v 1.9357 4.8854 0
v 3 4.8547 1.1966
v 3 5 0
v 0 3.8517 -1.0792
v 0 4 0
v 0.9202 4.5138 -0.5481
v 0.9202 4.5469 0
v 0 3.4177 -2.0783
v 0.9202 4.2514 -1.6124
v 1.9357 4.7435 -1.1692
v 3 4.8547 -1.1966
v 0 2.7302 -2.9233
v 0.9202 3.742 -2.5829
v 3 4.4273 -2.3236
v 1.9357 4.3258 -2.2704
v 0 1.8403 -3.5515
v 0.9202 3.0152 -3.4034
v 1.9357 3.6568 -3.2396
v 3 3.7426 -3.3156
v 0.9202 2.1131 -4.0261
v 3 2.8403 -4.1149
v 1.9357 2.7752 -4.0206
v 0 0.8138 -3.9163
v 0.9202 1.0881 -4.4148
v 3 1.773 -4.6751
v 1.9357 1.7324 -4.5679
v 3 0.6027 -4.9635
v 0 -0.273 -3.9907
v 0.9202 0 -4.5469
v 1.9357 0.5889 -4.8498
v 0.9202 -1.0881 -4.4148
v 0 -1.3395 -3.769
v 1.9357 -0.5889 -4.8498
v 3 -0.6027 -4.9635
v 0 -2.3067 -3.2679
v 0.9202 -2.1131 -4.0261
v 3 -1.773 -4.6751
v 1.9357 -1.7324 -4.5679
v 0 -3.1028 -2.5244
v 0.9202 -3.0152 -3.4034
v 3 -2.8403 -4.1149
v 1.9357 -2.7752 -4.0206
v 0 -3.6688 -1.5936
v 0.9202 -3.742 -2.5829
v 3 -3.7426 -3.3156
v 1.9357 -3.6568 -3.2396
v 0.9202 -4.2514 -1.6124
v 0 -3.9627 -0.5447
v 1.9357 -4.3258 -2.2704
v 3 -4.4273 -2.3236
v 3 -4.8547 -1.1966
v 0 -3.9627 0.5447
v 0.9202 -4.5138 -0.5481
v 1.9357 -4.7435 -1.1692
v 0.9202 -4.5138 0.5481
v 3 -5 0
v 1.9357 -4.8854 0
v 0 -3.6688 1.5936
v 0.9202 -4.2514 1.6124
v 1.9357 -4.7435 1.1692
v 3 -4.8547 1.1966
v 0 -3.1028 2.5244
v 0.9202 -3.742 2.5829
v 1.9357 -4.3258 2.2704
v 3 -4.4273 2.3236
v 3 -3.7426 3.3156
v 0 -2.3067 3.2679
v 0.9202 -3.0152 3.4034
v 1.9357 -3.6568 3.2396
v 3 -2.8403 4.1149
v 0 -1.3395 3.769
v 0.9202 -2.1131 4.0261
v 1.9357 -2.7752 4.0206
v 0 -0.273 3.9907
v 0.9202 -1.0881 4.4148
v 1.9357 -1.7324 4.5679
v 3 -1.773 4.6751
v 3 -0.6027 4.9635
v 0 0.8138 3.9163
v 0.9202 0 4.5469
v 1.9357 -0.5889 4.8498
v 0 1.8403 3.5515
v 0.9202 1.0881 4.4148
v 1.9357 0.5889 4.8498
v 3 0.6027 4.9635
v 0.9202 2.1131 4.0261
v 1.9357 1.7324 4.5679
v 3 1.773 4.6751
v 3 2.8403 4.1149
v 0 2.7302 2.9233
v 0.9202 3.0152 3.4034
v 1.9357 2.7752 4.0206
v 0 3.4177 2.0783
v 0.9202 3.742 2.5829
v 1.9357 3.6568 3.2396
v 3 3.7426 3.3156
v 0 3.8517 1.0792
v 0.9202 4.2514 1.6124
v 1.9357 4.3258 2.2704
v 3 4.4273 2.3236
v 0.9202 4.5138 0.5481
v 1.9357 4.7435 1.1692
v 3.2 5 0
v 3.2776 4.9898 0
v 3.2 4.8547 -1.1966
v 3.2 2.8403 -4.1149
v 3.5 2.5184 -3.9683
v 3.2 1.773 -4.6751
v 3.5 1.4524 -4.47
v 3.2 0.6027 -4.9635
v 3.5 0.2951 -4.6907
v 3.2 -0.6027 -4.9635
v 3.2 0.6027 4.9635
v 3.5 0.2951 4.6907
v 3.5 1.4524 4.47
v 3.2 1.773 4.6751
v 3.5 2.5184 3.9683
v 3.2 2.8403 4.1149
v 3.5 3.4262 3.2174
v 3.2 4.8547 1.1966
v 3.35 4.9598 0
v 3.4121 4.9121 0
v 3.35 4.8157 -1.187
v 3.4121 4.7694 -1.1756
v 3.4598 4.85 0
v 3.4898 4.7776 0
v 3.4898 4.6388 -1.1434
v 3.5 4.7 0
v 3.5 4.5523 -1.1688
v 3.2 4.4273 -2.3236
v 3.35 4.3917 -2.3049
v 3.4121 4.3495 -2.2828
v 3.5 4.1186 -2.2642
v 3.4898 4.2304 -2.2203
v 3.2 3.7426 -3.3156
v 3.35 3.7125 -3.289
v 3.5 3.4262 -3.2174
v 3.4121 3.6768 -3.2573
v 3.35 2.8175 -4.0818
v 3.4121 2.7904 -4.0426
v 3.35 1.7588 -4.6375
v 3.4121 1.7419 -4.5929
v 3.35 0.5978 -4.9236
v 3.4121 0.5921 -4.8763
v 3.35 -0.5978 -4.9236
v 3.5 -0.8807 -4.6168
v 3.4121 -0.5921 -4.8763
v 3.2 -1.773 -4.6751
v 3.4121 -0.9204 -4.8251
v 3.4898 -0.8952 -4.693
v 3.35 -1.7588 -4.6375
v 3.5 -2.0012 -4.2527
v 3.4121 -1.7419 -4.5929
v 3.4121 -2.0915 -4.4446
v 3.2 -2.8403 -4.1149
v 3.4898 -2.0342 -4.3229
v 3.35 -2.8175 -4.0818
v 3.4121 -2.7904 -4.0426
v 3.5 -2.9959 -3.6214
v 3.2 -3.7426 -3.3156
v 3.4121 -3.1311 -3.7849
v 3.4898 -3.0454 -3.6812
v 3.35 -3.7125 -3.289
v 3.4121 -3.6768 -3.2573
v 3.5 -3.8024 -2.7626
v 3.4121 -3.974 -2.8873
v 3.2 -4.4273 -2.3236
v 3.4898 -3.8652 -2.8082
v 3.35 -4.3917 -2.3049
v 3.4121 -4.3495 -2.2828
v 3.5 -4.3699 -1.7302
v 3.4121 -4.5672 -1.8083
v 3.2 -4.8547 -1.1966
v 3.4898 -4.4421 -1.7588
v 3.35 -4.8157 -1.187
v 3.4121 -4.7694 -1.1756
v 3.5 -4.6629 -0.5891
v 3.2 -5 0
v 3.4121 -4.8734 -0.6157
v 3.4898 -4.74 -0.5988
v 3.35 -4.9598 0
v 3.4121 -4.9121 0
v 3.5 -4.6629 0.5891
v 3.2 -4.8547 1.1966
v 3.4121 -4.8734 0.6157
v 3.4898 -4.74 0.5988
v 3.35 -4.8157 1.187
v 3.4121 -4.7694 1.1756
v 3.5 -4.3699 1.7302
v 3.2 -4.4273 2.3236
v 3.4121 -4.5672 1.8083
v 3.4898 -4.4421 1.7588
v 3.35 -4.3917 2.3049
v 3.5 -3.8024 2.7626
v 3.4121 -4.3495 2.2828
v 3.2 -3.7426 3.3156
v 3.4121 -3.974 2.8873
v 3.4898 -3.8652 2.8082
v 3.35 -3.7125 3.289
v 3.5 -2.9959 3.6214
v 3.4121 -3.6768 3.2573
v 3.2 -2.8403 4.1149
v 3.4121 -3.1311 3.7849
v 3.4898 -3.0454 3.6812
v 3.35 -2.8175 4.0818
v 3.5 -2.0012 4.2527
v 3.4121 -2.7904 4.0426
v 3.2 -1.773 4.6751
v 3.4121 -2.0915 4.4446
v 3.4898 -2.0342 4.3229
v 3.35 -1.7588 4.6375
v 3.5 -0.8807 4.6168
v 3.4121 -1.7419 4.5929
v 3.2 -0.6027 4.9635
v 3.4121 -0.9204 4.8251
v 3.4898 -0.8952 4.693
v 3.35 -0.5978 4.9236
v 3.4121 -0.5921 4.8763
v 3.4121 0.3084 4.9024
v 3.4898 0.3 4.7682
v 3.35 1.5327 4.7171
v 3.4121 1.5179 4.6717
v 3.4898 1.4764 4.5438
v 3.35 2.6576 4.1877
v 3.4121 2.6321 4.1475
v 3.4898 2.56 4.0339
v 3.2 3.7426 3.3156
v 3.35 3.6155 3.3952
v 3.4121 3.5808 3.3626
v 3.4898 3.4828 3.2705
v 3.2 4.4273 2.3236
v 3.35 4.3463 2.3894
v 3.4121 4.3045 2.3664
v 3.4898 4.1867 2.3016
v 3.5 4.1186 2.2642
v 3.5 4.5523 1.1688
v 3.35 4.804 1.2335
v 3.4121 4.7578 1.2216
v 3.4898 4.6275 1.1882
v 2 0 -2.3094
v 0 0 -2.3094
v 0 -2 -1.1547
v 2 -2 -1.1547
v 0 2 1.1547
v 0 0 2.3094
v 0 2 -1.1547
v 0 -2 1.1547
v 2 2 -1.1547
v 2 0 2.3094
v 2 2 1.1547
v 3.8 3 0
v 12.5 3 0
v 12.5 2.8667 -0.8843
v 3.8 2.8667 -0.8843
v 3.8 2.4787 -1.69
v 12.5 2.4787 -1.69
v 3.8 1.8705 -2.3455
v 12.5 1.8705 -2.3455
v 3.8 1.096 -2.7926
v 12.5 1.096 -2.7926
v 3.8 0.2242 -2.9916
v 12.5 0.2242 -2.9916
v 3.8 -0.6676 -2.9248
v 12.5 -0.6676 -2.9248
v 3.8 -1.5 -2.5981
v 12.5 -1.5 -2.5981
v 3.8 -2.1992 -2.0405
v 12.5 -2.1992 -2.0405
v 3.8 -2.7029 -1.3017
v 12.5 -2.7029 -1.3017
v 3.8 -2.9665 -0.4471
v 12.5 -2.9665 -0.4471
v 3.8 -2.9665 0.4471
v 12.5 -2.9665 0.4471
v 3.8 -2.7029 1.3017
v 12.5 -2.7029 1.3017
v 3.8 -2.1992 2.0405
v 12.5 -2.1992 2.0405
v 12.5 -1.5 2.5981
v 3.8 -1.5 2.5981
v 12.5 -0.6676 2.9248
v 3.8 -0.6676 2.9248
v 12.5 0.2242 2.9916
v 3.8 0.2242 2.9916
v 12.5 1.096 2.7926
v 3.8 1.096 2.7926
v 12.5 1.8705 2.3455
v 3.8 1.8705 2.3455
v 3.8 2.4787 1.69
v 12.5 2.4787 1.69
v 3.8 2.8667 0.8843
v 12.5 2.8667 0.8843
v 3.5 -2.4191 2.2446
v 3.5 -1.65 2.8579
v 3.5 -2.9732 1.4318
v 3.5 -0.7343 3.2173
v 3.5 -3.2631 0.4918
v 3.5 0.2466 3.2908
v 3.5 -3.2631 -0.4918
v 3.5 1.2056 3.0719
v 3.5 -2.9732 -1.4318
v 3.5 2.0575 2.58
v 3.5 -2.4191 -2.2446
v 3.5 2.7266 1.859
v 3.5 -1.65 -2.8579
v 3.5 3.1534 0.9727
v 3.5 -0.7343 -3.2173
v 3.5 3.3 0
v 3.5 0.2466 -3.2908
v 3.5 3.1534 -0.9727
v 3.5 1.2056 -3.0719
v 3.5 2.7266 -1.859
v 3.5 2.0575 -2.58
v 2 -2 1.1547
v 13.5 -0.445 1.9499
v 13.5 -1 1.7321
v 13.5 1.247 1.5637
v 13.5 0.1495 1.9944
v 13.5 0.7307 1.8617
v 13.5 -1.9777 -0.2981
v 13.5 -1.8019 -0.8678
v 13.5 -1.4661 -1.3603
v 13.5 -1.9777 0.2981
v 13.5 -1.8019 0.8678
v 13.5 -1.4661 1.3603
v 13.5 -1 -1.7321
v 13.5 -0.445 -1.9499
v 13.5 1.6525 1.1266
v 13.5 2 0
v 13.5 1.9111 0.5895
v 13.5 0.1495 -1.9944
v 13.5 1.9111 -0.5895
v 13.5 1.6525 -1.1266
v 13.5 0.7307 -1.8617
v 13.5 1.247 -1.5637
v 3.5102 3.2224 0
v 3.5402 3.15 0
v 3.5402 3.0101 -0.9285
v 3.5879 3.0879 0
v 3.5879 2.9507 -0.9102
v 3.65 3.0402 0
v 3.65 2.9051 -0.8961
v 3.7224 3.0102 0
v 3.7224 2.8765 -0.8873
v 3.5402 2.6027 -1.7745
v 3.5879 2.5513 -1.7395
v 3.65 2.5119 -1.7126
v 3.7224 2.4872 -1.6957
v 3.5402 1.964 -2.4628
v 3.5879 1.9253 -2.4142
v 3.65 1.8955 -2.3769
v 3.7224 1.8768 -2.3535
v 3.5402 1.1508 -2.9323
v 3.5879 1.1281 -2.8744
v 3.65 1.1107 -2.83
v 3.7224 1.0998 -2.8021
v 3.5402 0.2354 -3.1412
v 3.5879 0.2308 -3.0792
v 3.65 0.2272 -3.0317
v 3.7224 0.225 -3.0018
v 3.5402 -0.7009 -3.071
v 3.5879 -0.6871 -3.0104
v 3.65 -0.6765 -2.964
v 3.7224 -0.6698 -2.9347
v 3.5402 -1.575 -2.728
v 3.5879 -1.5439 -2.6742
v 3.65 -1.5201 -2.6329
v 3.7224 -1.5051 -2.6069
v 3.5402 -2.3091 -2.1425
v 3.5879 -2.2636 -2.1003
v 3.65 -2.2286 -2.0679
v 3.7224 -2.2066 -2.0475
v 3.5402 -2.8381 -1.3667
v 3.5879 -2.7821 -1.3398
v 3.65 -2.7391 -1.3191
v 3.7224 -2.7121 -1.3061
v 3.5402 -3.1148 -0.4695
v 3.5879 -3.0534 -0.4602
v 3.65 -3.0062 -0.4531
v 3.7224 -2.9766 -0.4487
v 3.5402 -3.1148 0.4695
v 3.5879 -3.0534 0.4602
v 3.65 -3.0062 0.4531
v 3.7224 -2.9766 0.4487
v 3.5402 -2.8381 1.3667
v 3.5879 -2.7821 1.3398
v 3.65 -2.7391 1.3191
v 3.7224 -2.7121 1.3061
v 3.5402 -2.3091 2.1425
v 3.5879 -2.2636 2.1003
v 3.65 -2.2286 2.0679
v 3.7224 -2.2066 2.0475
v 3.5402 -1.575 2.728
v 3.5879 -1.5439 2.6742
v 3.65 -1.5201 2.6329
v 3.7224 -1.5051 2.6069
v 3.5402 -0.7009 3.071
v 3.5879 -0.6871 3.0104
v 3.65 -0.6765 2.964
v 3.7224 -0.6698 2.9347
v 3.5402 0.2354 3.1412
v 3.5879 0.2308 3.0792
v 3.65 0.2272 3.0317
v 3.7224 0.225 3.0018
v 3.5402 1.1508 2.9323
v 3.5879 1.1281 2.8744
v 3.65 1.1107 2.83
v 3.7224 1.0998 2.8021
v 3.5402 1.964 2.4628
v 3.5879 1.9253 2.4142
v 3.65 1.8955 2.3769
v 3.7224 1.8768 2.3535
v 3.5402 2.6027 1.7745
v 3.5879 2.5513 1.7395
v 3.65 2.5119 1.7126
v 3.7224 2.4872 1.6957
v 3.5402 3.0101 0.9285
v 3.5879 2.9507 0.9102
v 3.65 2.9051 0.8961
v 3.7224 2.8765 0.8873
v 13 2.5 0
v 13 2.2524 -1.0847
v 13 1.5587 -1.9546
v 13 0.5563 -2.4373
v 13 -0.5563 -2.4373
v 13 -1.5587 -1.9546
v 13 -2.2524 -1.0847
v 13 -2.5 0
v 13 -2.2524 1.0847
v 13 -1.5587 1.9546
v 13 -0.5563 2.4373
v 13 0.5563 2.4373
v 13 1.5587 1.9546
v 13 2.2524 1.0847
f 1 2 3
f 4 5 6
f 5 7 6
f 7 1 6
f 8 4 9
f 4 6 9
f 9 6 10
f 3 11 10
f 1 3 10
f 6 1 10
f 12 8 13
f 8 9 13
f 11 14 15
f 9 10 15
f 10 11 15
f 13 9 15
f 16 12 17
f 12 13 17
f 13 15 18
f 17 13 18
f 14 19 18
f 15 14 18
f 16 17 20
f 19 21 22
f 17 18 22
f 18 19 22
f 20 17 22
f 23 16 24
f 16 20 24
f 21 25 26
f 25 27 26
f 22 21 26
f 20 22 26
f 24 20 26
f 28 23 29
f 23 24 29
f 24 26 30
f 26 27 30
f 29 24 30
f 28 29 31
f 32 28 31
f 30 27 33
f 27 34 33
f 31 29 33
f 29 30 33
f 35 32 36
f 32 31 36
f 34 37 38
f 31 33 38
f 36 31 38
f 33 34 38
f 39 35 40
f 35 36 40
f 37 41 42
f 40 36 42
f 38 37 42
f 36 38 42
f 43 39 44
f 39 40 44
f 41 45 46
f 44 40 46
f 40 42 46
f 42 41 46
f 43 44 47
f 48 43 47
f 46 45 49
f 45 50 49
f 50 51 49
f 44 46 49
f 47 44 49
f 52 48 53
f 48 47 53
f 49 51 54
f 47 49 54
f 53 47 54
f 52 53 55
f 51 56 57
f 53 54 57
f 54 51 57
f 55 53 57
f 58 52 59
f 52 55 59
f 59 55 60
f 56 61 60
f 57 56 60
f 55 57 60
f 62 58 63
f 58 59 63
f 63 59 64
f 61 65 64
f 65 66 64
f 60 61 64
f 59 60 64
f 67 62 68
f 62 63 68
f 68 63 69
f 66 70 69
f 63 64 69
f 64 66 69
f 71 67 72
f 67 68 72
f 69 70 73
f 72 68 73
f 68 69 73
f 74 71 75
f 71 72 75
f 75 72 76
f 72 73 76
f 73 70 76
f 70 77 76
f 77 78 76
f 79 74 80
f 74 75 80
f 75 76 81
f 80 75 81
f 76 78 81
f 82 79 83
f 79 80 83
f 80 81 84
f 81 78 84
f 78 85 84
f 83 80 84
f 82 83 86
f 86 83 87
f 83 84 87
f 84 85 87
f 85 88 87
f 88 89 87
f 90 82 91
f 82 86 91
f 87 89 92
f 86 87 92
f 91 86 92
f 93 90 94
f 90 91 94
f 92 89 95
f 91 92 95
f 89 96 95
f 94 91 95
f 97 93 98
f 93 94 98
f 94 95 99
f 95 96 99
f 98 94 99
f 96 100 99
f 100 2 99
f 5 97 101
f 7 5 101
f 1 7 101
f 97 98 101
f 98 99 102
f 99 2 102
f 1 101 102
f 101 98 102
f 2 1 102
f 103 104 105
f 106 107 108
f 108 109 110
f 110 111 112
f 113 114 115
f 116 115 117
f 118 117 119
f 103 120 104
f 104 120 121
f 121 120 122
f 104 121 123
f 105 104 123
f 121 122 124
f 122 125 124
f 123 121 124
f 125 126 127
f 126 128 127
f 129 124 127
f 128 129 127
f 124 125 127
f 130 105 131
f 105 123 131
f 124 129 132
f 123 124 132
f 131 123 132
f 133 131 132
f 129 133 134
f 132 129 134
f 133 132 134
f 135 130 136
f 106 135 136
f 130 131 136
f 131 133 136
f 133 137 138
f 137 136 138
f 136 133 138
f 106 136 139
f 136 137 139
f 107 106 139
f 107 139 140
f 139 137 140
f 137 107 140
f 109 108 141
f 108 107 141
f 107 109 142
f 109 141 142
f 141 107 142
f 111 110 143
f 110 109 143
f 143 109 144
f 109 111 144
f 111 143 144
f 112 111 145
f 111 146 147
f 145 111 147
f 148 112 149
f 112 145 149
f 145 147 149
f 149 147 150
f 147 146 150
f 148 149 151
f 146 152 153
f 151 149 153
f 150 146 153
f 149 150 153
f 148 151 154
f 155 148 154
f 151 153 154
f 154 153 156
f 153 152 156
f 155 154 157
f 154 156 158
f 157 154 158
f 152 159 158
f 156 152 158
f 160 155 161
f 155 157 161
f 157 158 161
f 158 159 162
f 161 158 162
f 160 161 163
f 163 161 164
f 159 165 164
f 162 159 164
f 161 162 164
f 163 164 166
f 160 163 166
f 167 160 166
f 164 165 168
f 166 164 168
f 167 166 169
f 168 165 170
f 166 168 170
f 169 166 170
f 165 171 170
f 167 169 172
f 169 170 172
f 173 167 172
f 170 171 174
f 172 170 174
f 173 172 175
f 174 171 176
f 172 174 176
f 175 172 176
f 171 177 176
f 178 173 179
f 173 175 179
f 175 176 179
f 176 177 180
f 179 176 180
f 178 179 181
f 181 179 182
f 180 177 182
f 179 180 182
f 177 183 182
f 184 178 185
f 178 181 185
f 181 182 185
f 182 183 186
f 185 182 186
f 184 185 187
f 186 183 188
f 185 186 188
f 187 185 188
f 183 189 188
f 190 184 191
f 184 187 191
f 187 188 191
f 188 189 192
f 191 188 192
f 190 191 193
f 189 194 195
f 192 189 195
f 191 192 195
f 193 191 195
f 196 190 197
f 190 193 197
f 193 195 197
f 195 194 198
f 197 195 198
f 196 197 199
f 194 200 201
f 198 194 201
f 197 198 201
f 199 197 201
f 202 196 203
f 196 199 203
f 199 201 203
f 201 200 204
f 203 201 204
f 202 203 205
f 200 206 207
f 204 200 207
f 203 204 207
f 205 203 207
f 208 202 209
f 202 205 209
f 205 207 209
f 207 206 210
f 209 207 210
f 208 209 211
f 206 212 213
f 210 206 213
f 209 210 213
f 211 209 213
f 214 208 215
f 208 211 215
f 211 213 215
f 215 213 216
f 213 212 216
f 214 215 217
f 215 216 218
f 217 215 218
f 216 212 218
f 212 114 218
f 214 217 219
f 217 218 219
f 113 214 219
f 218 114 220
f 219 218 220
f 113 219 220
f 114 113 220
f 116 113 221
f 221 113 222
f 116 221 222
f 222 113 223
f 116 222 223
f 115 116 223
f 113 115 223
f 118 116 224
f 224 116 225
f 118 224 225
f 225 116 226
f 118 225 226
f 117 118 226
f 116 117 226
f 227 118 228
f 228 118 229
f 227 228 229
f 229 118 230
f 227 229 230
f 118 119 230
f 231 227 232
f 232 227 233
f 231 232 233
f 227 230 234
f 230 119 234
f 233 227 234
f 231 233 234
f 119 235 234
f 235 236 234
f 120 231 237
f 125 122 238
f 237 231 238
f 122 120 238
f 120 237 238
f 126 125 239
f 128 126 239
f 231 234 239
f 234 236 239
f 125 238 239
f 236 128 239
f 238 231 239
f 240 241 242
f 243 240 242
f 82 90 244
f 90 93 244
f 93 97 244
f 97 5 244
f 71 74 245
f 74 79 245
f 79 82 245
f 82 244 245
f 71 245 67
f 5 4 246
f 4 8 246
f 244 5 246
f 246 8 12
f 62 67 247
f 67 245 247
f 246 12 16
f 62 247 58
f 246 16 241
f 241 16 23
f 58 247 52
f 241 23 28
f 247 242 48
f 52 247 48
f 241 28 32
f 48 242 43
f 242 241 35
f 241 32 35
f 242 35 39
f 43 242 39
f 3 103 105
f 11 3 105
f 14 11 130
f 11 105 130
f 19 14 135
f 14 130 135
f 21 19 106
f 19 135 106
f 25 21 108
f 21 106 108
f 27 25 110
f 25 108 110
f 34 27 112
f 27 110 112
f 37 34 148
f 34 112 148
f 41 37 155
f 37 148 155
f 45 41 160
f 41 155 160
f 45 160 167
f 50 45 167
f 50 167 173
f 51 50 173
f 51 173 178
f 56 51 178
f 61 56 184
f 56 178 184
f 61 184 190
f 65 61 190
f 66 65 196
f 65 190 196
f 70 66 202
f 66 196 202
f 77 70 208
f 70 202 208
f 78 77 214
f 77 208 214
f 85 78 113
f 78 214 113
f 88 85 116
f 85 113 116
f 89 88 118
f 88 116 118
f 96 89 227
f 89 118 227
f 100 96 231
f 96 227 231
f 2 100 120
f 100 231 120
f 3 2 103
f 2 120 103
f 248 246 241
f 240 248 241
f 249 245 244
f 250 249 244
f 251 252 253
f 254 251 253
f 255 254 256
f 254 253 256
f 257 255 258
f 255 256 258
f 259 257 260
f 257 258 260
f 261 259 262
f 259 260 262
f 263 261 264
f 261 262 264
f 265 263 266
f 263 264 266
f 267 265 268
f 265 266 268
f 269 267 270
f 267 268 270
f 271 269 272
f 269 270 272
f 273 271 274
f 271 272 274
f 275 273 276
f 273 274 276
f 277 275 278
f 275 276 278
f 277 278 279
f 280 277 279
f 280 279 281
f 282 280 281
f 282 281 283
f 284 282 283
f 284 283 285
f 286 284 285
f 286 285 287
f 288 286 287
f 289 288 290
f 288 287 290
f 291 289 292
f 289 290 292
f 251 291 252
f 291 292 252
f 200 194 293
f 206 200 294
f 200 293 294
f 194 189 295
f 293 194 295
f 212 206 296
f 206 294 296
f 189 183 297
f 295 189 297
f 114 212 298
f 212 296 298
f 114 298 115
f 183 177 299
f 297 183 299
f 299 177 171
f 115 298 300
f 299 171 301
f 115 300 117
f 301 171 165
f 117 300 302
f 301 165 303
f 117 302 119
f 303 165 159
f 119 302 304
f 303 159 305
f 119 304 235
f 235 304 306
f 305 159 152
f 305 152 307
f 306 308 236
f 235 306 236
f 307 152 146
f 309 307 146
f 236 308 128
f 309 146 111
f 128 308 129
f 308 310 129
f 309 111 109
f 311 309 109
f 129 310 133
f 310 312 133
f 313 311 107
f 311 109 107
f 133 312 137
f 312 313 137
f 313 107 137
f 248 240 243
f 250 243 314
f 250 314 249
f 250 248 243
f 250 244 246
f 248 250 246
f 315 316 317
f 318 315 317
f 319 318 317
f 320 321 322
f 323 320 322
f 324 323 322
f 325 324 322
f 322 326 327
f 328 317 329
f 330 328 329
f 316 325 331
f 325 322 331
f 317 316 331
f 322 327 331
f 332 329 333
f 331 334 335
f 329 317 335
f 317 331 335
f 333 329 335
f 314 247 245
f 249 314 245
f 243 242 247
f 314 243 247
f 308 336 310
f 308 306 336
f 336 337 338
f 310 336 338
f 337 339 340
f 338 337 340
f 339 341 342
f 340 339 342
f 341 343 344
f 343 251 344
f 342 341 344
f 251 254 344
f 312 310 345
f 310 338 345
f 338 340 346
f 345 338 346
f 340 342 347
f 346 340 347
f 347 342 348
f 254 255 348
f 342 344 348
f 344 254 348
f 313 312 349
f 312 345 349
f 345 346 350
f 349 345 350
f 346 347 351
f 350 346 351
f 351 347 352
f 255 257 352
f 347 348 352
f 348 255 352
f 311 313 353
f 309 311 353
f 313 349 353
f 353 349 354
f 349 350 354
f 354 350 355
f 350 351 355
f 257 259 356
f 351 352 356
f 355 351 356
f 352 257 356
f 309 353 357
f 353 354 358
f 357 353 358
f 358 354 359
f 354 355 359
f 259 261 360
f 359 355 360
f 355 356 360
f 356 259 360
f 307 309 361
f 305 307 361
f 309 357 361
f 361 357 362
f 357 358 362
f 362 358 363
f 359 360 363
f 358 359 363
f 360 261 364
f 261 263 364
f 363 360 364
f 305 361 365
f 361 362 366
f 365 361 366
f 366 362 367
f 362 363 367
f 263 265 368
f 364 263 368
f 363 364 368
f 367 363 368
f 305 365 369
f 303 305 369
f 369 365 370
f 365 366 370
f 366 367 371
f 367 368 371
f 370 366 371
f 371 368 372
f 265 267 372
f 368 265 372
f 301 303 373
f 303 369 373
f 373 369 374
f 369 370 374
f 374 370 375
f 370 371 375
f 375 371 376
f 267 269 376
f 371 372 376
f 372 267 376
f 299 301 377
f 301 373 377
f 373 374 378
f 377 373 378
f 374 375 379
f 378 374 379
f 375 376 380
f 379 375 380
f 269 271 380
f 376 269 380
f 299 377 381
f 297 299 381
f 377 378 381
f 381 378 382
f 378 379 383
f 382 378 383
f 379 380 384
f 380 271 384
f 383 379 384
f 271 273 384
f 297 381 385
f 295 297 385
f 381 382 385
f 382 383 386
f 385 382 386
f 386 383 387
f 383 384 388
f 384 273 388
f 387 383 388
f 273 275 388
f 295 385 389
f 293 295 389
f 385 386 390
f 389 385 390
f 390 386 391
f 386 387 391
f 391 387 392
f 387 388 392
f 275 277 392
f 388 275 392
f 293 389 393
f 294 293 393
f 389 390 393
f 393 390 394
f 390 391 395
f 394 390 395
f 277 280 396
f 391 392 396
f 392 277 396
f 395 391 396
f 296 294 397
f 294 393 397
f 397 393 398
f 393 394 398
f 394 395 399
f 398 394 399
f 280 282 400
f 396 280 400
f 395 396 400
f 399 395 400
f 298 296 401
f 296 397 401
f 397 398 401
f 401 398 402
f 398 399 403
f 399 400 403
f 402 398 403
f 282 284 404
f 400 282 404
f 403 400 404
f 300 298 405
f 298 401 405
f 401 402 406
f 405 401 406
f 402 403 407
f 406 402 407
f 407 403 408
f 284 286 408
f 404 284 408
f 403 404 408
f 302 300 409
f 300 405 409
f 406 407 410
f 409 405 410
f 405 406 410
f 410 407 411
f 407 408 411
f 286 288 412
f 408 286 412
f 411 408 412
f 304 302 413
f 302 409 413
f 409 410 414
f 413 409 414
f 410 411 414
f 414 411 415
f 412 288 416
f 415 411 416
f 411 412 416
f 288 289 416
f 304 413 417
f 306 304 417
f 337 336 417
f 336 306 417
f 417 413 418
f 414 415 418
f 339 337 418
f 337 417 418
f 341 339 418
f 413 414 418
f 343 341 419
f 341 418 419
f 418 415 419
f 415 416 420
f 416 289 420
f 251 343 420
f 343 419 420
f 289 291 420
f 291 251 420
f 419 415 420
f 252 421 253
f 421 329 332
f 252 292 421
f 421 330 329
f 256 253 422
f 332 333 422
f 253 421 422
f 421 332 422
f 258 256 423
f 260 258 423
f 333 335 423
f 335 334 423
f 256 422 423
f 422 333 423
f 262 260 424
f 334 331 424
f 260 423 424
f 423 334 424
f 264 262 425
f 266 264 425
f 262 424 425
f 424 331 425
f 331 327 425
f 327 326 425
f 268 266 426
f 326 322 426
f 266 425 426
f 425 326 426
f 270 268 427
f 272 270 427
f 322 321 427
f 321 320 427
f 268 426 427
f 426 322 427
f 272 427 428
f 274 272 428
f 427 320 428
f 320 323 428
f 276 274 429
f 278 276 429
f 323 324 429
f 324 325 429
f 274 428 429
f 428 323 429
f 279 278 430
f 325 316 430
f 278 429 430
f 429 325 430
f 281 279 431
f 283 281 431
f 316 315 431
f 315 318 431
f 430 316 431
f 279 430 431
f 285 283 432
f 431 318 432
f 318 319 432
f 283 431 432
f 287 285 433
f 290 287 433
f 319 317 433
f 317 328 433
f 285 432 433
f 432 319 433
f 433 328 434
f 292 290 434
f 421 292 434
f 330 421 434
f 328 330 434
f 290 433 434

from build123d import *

# Parameters (mm, degrees)
CUT_EXTRUDE_1_DEPTH = 2
FILLET_1_R          = 0.3
CHAMFER_1_SIZE      = 1


with BuildPart() as part:
    # Эскиз1 → Повернуть1 (revolve)
    with BuildSketch(Plane.XY):
        with BuildLine():
            Line((0, 0), (0, 4))
            ThreePointArc((0, 4), (1.41886117, 4.74341649), (3, 5))
            Line((3, 5), (3.5, 5))
            Line((3.5, 5), (3.5, 3))
            Line((3.5, 3), (13.5, 3))
            Line((13.5, 3), (13.5, 0))
            Line((13.5, 0), (0, 0))
        make_face()
    revolve(axis=Axis((13.5, 0, 0), (-1, 0, 0)))

    # Эскиз2 → Вырез-Вытянуть1 (cut)
    with BuildSketch(Plane.ZY):
        Polygon((1.154700538, 2), (-1.154700538, 2), (-2.309401077, 0), (-1.154700538, -2), (1.154700538, -2), (2.309401077, 0), align=None)
    extrude(amount=-CUT_EXTRUDE_1_DEPTH, mode=Mode.SUBTRACT)

    # Скругление1
    fillet_1_edges = [part.edges().sort_by_distance(p)[0] for p in [
        (3.5, -3, 0),
        (3.5, -5, 0),
    ]]
    fillet(fillet_1_edges, radius=FILLET_1_R)

    # Фаска1
    chamfer_1_edges = [part.edges().sort_by_distance(p)[0] for p in [
        (13.5, -3, 0),
    ]]
    chamfer(chamfer_1_edges, length=CHAMFER_1_SIZE)


solid = part.part
